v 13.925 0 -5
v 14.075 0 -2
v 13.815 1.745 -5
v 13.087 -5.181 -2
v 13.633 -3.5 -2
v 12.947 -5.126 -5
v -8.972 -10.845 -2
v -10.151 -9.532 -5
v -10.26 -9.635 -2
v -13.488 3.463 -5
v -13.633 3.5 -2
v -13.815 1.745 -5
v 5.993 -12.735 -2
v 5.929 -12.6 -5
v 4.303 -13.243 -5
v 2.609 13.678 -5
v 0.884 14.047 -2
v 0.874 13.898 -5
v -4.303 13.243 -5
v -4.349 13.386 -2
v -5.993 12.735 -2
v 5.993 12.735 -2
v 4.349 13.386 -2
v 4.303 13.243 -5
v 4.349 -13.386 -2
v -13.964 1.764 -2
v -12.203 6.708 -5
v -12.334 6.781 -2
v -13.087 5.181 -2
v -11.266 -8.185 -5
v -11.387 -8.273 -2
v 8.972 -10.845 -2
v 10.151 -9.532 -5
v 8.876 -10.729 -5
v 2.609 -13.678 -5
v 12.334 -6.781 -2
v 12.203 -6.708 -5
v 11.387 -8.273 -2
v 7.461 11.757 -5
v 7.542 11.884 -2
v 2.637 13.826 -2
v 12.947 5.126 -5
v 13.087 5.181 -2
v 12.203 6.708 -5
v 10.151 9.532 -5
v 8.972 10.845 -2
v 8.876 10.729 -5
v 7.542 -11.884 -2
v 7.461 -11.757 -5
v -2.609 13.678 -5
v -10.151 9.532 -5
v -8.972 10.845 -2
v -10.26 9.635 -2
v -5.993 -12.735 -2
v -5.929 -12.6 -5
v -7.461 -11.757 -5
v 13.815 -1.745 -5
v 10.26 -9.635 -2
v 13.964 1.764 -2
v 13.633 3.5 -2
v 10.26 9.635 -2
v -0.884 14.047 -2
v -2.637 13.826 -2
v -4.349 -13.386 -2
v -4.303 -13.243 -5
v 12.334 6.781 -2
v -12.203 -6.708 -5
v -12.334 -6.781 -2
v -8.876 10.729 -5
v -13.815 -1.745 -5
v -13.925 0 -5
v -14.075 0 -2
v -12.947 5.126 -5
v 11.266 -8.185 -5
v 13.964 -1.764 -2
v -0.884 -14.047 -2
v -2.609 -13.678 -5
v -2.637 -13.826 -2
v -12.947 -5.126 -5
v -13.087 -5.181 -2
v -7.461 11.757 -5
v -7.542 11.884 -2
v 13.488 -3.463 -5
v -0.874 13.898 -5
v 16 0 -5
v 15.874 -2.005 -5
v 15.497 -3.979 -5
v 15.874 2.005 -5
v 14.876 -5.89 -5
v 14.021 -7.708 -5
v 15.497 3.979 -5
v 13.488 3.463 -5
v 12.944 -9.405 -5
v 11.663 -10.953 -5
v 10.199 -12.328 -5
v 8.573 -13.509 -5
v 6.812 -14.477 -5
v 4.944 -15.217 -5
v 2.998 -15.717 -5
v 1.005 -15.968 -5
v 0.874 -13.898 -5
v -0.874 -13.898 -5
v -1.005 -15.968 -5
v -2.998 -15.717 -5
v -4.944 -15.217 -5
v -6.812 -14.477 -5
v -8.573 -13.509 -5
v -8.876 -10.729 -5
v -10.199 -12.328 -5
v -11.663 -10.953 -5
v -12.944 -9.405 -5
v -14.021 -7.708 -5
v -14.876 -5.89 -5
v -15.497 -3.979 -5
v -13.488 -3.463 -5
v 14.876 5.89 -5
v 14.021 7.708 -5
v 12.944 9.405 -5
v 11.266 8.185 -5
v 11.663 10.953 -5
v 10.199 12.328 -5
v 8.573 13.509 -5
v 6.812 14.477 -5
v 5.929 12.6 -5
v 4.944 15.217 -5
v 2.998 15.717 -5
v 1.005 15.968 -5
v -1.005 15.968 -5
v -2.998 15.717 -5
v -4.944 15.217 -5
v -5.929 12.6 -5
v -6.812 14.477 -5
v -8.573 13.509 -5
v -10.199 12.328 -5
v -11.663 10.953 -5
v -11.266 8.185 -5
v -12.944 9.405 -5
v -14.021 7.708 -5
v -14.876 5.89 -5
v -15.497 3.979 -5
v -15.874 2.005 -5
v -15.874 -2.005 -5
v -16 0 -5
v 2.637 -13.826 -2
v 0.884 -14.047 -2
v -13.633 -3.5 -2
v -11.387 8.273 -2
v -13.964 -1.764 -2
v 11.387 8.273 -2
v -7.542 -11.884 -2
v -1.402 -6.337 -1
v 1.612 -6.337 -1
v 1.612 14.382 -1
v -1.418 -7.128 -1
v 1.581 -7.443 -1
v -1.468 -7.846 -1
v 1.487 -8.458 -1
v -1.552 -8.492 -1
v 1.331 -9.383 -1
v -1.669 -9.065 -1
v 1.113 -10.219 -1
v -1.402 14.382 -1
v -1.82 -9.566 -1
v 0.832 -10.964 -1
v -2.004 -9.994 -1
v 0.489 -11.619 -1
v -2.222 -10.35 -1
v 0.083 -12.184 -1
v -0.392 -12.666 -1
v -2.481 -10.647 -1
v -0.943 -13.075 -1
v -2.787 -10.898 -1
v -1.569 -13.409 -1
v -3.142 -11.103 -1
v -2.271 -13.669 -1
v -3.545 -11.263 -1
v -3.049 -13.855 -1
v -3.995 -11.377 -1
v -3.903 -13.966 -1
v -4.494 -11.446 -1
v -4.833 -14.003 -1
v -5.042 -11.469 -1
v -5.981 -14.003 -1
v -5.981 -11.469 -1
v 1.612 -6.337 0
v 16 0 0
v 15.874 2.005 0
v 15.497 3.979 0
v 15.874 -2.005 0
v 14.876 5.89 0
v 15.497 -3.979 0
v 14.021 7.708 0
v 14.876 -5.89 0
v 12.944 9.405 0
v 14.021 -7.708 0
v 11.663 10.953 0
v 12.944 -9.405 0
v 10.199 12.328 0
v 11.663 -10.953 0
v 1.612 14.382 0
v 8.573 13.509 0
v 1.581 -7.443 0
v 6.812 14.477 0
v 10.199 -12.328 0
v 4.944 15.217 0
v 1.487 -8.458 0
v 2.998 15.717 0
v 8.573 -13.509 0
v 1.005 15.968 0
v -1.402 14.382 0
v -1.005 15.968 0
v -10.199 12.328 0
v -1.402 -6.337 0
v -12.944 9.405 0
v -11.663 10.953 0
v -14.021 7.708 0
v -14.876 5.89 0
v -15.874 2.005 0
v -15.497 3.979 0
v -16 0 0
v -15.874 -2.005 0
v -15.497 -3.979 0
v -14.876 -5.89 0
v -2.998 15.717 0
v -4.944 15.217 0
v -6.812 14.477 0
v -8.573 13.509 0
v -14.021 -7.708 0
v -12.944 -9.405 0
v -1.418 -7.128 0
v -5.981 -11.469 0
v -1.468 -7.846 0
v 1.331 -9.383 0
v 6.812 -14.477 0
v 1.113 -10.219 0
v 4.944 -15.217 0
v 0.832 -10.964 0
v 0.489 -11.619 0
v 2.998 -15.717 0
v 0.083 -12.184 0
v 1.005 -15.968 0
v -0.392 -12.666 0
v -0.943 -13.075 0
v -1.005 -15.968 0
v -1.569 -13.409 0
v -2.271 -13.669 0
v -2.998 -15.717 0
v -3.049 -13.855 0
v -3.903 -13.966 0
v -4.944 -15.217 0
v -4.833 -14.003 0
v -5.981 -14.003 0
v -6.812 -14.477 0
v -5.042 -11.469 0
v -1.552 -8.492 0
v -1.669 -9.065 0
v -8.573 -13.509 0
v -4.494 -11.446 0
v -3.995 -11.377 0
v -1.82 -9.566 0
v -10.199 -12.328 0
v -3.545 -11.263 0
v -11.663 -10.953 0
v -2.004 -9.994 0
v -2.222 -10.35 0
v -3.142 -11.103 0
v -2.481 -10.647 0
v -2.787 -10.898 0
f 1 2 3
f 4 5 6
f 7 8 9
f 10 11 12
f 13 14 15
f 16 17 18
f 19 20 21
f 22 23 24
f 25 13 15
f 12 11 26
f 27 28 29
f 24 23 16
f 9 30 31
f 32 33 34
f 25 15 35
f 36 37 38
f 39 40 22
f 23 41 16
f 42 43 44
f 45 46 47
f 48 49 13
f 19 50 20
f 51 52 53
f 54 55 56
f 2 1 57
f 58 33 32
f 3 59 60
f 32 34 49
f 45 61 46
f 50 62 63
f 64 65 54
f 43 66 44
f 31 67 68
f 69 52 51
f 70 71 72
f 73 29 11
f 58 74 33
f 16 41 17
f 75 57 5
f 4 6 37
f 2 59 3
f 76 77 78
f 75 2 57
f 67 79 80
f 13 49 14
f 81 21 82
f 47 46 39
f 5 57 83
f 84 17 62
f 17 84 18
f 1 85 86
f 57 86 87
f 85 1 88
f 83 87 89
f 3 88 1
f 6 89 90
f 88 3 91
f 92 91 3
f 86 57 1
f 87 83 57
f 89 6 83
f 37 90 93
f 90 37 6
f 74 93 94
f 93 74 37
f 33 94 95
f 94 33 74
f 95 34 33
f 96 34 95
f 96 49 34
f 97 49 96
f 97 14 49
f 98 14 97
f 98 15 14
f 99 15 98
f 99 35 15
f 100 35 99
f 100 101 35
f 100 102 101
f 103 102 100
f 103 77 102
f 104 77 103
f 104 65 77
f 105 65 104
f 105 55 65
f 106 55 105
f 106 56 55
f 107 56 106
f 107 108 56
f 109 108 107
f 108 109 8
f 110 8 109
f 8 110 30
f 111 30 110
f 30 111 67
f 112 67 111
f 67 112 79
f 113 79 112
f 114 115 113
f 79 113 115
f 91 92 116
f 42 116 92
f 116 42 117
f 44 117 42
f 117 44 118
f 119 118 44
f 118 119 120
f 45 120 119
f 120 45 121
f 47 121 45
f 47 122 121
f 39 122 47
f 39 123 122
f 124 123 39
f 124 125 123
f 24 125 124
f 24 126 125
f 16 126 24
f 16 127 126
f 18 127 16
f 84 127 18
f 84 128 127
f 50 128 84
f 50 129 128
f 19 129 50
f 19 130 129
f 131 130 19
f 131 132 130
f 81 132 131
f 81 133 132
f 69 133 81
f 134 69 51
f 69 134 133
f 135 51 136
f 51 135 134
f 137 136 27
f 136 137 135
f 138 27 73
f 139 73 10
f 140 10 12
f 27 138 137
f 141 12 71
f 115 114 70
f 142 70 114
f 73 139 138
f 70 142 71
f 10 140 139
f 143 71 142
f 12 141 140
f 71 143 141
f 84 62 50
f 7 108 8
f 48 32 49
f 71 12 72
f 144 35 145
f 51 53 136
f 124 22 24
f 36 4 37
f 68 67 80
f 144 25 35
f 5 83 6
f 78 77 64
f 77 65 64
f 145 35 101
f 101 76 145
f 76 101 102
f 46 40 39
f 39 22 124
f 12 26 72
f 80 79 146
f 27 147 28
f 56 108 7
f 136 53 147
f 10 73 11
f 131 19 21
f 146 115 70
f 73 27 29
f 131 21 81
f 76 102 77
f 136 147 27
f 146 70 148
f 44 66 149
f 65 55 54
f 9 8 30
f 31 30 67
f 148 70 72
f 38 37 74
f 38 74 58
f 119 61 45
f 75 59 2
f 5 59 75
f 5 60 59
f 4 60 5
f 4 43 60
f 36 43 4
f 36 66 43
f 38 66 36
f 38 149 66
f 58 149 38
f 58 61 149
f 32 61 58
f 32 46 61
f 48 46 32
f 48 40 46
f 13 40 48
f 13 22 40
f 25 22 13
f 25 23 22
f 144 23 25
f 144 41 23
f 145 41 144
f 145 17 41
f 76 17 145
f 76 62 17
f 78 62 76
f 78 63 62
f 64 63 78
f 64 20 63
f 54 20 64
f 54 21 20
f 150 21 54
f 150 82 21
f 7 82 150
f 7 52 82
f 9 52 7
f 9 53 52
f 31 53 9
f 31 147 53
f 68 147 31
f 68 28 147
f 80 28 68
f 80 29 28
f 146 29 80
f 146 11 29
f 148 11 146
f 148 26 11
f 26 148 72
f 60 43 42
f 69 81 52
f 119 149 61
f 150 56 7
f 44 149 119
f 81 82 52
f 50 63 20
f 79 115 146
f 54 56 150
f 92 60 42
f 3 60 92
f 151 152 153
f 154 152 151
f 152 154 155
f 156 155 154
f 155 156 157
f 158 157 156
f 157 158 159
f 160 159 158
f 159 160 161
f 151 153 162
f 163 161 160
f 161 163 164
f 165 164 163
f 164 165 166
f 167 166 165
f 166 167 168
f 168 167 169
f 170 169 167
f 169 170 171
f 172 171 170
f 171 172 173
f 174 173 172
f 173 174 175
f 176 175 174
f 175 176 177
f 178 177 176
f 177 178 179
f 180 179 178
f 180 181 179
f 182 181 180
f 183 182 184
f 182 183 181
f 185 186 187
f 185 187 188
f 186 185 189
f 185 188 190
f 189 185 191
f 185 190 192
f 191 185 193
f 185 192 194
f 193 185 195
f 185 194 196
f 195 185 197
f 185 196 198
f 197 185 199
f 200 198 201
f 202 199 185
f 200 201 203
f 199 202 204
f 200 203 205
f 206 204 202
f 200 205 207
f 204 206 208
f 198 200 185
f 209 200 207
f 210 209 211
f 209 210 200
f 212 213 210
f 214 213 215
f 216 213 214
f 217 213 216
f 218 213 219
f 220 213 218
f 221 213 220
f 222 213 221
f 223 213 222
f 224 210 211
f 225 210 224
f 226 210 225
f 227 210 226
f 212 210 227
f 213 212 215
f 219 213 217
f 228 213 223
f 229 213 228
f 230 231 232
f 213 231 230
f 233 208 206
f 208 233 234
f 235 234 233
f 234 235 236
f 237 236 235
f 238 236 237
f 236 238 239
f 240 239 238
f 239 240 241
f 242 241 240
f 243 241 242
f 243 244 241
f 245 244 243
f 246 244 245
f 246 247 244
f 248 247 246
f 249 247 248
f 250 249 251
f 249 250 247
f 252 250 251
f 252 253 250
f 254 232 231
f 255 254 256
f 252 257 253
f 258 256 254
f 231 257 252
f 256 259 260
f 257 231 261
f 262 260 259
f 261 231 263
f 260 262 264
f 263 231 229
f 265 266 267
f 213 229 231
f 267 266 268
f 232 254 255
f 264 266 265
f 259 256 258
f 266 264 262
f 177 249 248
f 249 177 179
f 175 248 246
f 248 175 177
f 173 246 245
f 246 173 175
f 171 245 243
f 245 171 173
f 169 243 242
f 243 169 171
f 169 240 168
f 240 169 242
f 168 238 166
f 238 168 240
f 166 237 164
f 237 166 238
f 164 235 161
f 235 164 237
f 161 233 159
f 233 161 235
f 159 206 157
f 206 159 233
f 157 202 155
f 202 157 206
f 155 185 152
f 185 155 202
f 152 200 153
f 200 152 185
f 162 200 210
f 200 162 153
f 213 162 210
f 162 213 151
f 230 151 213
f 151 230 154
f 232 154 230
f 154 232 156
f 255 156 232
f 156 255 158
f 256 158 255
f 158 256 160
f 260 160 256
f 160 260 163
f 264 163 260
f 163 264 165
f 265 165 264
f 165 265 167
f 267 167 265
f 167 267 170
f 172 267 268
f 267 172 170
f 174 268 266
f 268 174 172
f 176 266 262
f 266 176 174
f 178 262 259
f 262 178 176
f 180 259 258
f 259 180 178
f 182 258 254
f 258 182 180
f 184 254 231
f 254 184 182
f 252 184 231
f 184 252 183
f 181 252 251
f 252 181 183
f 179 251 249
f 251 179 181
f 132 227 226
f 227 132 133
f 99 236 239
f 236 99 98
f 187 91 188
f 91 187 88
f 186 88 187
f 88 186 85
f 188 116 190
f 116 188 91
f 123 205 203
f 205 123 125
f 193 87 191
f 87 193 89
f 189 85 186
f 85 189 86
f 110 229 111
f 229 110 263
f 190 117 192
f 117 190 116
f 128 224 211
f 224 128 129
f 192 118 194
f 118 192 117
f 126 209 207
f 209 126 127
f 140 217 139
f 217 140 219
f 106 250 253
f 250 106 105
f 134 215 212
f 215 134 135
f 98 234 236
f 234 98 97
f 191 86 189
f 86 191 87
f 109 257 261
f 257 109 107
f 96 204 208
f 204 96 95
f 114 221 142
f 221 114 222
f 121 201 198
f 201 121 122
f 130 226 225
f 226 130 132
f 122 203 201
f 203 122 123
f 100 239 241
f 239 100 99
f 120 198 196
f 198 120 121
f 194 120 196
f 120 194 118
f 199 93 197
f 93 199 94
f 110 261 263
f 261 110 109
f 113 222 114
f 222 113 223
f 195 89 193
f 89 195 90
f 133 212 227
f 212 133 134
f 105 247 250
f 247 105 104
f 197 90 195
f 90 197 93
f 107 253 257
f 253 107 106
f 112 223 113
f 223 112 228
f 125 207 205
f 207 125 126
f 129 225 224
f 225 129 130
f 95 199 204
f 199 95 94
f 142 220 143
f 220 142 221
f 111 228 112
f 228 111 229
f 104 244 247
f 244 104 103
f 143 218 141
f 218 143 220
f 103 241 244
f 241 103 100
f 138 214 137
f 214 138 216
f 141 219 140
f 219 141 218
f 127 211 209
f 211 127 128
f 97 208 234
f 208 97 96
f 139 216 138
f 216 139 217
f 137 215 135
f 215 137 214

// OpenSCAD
$fn = 50;


difference() {
	union() {
		translate(v = [0, 0, -5.0000000000]) {
			cylinder(h = 5, r = 16.0000000000);
		}
	}
	union() {
		#translate(v = [0, 0, -5.0000000000]) {
			cylinder(h = 3, r1 = 13.9250000000, r2 = 14.0750000000);
		}
		translate(v = [0, 0, -1]) {
			linear_extrude(height = 1) {
				text(font = "Wingdings", halign = "center", size = 22, text = "J", valign = "center");
			}
		}
	}
}
